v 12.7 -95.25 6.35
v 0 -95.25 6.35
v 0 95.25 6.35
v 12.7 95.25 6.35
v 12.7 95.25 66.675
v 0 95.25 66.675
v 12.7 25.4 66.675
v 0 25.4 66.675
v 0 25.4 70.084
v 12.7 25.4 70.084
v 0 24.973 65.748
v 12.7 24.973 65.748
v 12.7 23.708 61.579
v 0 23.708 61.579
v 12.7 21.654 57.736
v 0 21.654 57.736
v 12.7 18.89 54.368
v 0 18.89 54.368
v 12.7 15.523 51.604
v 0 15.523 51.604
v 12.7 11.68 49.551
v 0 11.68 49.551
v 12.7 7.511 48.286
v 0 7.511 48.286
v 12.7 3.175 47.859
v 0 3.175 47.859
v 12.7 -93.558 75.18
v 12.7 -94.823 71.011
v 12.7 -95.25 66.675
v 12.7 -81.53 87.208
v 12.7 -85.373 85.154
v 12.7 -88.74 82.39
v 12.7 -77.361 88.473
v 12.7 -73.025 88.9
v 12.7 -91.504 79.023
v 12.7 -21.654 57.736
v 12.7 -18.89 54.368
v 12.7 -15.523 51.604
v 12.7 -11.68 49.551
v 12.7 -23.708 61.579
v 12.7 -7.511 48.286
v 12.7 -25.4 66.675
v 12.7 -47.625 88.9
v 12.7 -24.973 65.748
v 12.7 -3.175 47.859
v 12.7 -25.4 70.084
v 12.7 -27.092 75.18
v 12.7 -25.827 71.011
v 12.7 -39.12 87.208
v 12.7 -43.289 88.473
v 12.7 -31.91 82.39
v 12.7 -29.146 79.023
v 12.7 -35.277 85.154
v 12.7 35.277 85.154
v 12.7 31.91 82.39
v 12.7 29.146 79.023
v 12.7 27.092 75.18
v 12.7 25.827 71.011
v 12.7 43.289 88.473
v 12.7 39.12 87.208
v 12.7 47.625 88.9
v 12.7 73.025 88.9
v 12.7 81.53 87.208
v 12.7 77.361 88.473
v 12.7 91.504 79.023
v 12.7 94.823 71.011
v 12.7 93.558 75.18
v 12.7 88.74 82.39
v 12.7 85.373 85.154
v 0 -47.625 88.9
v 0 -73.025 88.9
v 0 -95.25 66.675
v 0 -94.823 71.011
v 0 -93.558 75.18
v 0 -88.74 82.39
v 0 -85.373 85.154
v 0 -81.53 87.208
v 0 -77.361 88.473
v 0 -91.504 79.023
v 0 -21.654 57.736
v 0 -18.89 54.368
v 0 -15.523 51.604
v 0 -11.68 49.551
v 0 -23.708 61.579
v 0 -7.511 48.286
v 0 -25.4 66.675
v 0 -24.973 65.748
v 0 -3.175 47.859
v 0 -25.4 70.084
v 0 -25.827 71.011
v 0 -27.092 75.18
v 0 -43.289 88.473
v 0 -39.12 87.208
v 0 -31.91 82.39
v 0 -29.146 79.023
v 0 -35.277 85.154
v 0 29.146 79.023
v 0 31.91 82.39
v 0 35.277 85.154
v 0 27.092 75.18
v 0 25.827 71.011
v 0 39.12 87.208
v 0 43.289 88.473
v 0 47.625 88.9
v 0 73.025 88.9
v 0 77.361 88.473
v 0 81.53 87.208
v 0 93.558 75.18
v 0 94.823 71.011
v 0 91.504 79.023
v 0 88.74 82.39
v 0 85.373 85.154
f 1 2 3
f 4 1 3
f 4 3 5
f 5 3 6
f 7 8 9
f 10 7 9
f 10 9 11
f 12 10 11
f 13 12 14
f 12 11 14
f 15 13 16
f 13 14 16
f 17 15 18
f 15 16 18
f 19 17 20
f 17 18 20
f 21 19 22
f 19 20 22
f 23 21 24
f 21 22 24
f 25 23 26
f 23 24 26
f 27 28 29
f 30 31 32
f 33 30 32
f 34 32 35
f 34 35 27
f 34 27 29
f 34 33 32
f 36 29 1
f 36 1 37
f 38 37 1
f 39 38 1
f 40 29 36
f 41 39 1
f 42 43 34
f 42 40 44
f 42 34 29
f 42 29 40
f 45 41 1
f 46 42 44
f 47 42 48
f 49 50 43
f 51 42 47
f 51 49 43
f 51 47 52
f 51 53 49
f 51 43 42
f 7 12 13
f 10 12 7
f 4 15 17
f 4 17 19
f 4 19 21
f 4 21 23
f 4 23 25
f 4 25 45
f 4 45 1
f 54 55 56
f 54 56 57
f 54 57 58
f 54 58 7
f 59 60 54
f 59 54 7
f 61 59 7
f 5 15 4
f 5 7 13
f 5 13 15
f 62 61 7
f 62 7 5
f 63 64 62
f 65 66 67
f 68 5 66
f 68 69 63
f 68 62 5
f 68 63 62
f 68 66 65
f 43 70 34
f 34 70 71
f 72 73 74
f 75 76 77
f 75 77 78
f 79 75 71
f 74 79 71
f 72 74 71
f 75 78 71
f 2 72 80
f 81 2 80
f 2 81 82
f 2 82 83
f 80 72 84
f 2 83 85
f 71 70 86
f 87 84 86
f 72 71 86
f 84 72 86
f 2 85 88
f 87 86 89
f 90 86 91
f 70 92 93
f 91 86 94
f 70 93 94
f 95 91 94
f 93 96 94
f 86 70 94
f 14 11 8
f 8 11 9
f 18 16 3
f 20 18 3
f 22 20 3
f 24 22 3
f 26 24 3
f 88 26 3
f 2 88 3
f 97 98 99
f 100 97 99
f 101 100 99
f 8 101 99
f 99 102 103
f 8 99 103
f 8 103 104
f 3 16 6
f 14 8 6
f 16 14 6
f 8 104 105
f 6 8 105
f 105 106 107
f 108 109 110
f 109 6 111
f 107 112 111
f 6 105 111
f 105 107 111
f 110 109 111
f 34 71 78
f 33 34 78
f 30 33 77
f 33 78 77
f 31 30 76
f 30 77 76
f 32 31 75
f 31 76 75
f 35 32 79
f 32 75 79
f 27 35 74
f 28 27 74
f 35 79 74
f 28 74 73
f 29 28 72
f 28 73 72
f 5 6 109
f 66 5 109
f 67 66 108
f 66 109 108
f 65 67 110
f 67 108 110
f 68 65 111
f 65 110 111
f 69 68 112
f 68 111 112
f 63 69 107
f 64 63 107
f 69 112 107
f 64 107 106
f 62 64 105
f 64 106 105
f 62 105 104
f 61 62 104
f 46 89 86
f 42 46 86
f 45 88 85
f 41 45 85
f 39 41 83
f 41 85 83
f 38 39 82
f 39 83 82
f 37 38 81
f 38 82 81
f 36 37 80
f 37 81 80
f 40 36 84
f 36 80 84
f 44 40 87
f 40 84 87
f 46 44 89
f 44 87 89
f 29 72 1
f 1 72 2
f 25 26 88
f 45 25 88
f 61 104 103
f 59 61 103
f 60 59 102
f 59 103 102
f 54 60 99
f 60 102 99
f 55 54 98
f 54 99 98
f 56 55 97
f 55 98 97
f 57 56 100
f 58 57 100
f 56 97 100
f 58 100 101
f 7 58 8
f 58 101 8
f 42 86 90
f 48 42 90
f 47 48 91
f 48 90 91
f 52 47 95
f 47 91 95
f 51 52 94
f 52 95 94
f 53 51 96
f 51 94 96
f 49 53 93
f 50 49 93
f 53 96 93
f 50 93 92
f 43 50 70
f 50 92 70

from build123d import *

# Parameters (mm, degrees)
F1_DEPTH = 12.7


with BuildPart() as f1:
    # F0 (on Right) → F1 (new body)
    with BuildSketch(Plane.YZ):
        with BuildLine():
            Line((-47.625, 88.9), (-73.025, 88.9))
            ThreePointArc((-73.025, 88.9), (-88.740448, 82.390448), (-95.25, 66.675))
            Line((-95.25, 66.675), (-95.25, 6.35))
            Line((-95.25, 6.35), (95.25, 6.35))
            Line((95.25, 6.35), (95.25, 66.675))
            ThreePointArc((95.25, 66.675), (88.740448, 82.390448), (73.025, 88.9))
            Line((73.025, 88.9), (47.625, 88.9))
            ThreePointArc((47.625, 88.9), (31.909552, 82.390448), (25.4, 66.675))
            Line((25.4, 66.675), (25.4, 70.083901))
            ThreePointArc((25.4, 70.083901), (18.890448, 54.368453), (3.175, 47.858901))
            Line((3.175, 47.858901), (-3.175, 47.858901))
            ThreePointArc((-3.175, 47.858901), (-18.890448, 54.368453), (-25.4, 70.083901))
            Line((-25.4, 70.083901), (-25.4, 66.675))
            ThreePointArc((-25.4, 66.675), (-31.909552, 82.390448), (-47.625, 88.9))
        make_face()
    extrude(amount=F1_DEPTH)


solid = f1.part
